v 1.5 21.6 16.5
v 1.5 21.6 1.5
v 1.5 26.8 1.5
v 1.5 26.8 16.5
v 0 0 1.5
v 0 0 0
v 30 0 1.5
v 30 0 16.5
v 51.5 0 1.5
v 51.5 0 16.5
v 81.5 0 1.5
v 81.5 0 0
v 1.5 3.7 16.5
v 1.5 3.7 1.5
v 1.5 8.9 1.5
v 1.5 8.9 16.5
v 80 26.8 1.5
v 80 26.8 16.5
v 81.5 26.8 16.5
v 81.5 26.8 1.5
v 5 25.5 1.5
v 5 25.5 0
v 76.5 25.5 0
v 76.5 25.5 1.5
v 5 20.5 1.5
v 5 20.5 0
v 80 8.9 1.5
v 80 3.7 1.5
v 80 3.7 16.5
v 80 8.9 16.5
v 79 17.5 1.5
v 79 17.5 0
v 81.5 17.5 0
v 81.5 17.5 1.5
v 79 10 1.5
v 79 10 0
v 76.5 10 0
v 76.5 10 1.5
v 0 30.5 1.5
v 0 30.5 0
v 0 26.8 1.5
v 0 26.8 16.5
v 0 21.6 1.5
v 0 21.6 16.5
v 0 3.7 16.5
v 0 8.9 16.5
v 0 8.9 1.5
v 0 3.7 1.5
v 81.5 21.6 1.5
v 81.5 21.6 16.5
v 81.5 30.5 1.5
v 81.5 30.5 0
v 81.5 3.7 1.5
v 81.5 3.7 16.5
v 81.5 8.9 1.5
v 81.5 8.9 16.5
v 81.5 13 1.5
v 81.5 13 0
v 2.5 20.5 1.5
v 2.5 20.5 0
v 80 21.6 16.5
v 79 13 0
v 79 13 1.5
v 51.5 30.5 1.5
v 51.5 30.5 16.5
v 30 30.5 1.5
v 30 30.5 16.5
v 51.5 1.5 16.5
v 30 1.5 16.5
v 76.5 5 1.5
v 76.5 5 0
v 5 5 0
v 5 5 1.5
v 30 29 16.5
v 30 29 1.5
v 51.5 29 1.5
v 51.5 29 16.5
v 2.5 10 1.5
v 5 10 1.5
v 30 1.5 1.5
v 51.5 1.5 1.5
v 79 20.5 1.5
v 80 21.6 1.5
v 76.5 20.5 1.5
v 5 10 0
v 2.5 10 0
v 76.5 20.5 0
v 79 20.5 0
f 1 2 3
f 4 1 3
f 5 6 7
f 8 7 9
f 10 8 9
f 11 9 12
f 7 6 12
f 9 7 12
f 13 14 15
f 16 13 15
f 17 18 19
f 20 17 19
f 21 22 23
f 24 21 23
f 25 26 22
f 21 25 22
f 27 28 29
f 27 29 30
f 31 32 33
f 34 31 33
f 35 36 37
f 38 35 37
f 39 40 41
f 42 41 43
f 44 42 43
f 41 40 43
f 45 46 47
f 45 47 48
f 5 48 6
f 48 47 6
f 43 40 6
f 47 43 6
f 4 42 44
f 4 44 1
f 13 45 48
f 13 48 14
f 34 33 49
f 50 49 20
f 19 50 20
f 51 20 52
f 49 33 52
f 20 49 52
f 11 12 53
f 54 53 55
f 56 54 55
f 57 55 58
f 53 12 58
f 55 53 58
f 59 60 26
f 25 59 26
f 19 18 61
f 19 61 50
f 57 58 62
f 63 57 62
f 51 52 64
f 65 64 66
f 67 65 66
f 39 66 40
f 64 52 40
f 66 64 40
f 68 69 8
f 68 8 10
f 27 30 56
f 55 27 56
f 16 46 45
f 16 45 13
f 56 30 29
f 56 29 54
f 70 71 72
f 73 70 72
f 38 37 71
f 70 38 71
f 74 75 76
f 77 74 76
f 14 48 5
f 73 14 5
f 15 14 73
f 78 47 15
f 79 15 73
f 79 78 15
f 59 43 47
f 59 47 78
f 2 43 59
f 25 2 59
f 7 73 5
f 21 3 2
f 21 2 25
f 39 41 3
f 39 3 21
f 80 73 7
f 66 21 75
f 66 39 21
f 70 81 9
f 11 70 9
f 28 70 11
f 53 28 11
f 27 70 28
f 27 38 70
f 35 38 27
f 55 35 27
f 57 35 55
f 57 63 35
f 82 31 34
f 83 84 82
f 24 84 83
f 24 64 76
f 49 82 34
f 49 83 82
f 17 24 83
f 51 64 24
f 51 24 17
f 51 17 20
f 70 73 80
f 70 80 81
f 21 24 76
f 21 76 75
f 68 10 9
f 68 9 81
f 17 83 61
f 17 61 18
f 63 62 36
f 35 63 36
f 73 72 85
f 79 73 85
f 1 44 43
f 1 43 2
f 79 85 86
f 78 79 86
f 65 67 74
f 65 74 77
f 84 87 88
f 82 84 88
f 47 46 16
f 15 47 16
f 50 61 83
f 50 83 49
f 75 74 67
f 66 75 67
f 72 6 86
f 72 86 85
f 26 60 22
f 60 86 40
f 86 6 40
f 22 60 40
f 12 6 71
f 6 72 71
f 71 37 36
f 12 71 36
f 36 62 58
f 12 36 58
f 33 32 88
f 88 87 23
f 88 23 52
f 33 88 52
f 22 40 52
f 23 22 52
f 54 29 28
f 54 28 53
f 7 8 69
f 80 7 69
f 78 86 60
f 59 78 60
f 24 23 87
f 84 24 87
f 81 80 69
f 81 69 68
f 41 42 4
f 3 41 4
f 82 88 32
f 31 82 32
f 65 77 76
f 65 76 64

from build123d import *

# Parameters (mm, degrees)
BOSS_EXTRUDE1_DEPTH = 1.5
SKETCH2_W           = 1.5
SKETCH2_H           = 5.2
SKETCH2_W_2         = 21.5
SKETCH2_H_2         = 1.5
BOSS_EXTRUDE2_DEPTH = 15


with BuildPart() as part:
    # Sketch1 → Boss-Extrude1 (new body)
    with BuildSketch(Plane.XY):
        Polygon((0, 0), (81.5, 0), (81.5, 13), (79, 13), (79, 10), (76.5, 10), (76.5, 5), (5, 5), (5, 10), (2.5, 10), (2.5, 20.5), (5, 20.5), (5, 25.5), (76.5, 25.5), (76.5, 20.5), (79, 20.5), (79, 17.5), (81.5, 17.5), (81.5, 30.5), (0, 30.5), align=None)
    extrude(amount=BOSS_EXTRUDE1_DEPTH)

    # Sketch2 → Boss-Extrude2 (add)
    with BuildSketch(Plane.XY.offset(1.5)):
        with Locations((0.75, 24.2)):
            Rectangle(SKETCH2_W, SKETCH2_H)
        with Locations((40.75, 0.75)):
            Rectangle(SKETCH2_W_2, SKETCH2_H_2)
        with Locations((80.75, 6.3)):
            Rectangle(SKETCH2_W, SKETCH2_H)
        with Locations((40.75, 29.75)):
            Rectangle(SKETCH2_W_2, SKETCH2_H_2)
        with Locations((80.75, 24.2)):
            Rectangle(SKETCH2_W, SKETCH2_H)
        with Locations((0.75, 6.3)):
            Rectangle(SKETCH2_W, SKETCH2_H)
    extrude(amount=BOSS_EXTRUDE2_DEPTH)


solid = part.part
